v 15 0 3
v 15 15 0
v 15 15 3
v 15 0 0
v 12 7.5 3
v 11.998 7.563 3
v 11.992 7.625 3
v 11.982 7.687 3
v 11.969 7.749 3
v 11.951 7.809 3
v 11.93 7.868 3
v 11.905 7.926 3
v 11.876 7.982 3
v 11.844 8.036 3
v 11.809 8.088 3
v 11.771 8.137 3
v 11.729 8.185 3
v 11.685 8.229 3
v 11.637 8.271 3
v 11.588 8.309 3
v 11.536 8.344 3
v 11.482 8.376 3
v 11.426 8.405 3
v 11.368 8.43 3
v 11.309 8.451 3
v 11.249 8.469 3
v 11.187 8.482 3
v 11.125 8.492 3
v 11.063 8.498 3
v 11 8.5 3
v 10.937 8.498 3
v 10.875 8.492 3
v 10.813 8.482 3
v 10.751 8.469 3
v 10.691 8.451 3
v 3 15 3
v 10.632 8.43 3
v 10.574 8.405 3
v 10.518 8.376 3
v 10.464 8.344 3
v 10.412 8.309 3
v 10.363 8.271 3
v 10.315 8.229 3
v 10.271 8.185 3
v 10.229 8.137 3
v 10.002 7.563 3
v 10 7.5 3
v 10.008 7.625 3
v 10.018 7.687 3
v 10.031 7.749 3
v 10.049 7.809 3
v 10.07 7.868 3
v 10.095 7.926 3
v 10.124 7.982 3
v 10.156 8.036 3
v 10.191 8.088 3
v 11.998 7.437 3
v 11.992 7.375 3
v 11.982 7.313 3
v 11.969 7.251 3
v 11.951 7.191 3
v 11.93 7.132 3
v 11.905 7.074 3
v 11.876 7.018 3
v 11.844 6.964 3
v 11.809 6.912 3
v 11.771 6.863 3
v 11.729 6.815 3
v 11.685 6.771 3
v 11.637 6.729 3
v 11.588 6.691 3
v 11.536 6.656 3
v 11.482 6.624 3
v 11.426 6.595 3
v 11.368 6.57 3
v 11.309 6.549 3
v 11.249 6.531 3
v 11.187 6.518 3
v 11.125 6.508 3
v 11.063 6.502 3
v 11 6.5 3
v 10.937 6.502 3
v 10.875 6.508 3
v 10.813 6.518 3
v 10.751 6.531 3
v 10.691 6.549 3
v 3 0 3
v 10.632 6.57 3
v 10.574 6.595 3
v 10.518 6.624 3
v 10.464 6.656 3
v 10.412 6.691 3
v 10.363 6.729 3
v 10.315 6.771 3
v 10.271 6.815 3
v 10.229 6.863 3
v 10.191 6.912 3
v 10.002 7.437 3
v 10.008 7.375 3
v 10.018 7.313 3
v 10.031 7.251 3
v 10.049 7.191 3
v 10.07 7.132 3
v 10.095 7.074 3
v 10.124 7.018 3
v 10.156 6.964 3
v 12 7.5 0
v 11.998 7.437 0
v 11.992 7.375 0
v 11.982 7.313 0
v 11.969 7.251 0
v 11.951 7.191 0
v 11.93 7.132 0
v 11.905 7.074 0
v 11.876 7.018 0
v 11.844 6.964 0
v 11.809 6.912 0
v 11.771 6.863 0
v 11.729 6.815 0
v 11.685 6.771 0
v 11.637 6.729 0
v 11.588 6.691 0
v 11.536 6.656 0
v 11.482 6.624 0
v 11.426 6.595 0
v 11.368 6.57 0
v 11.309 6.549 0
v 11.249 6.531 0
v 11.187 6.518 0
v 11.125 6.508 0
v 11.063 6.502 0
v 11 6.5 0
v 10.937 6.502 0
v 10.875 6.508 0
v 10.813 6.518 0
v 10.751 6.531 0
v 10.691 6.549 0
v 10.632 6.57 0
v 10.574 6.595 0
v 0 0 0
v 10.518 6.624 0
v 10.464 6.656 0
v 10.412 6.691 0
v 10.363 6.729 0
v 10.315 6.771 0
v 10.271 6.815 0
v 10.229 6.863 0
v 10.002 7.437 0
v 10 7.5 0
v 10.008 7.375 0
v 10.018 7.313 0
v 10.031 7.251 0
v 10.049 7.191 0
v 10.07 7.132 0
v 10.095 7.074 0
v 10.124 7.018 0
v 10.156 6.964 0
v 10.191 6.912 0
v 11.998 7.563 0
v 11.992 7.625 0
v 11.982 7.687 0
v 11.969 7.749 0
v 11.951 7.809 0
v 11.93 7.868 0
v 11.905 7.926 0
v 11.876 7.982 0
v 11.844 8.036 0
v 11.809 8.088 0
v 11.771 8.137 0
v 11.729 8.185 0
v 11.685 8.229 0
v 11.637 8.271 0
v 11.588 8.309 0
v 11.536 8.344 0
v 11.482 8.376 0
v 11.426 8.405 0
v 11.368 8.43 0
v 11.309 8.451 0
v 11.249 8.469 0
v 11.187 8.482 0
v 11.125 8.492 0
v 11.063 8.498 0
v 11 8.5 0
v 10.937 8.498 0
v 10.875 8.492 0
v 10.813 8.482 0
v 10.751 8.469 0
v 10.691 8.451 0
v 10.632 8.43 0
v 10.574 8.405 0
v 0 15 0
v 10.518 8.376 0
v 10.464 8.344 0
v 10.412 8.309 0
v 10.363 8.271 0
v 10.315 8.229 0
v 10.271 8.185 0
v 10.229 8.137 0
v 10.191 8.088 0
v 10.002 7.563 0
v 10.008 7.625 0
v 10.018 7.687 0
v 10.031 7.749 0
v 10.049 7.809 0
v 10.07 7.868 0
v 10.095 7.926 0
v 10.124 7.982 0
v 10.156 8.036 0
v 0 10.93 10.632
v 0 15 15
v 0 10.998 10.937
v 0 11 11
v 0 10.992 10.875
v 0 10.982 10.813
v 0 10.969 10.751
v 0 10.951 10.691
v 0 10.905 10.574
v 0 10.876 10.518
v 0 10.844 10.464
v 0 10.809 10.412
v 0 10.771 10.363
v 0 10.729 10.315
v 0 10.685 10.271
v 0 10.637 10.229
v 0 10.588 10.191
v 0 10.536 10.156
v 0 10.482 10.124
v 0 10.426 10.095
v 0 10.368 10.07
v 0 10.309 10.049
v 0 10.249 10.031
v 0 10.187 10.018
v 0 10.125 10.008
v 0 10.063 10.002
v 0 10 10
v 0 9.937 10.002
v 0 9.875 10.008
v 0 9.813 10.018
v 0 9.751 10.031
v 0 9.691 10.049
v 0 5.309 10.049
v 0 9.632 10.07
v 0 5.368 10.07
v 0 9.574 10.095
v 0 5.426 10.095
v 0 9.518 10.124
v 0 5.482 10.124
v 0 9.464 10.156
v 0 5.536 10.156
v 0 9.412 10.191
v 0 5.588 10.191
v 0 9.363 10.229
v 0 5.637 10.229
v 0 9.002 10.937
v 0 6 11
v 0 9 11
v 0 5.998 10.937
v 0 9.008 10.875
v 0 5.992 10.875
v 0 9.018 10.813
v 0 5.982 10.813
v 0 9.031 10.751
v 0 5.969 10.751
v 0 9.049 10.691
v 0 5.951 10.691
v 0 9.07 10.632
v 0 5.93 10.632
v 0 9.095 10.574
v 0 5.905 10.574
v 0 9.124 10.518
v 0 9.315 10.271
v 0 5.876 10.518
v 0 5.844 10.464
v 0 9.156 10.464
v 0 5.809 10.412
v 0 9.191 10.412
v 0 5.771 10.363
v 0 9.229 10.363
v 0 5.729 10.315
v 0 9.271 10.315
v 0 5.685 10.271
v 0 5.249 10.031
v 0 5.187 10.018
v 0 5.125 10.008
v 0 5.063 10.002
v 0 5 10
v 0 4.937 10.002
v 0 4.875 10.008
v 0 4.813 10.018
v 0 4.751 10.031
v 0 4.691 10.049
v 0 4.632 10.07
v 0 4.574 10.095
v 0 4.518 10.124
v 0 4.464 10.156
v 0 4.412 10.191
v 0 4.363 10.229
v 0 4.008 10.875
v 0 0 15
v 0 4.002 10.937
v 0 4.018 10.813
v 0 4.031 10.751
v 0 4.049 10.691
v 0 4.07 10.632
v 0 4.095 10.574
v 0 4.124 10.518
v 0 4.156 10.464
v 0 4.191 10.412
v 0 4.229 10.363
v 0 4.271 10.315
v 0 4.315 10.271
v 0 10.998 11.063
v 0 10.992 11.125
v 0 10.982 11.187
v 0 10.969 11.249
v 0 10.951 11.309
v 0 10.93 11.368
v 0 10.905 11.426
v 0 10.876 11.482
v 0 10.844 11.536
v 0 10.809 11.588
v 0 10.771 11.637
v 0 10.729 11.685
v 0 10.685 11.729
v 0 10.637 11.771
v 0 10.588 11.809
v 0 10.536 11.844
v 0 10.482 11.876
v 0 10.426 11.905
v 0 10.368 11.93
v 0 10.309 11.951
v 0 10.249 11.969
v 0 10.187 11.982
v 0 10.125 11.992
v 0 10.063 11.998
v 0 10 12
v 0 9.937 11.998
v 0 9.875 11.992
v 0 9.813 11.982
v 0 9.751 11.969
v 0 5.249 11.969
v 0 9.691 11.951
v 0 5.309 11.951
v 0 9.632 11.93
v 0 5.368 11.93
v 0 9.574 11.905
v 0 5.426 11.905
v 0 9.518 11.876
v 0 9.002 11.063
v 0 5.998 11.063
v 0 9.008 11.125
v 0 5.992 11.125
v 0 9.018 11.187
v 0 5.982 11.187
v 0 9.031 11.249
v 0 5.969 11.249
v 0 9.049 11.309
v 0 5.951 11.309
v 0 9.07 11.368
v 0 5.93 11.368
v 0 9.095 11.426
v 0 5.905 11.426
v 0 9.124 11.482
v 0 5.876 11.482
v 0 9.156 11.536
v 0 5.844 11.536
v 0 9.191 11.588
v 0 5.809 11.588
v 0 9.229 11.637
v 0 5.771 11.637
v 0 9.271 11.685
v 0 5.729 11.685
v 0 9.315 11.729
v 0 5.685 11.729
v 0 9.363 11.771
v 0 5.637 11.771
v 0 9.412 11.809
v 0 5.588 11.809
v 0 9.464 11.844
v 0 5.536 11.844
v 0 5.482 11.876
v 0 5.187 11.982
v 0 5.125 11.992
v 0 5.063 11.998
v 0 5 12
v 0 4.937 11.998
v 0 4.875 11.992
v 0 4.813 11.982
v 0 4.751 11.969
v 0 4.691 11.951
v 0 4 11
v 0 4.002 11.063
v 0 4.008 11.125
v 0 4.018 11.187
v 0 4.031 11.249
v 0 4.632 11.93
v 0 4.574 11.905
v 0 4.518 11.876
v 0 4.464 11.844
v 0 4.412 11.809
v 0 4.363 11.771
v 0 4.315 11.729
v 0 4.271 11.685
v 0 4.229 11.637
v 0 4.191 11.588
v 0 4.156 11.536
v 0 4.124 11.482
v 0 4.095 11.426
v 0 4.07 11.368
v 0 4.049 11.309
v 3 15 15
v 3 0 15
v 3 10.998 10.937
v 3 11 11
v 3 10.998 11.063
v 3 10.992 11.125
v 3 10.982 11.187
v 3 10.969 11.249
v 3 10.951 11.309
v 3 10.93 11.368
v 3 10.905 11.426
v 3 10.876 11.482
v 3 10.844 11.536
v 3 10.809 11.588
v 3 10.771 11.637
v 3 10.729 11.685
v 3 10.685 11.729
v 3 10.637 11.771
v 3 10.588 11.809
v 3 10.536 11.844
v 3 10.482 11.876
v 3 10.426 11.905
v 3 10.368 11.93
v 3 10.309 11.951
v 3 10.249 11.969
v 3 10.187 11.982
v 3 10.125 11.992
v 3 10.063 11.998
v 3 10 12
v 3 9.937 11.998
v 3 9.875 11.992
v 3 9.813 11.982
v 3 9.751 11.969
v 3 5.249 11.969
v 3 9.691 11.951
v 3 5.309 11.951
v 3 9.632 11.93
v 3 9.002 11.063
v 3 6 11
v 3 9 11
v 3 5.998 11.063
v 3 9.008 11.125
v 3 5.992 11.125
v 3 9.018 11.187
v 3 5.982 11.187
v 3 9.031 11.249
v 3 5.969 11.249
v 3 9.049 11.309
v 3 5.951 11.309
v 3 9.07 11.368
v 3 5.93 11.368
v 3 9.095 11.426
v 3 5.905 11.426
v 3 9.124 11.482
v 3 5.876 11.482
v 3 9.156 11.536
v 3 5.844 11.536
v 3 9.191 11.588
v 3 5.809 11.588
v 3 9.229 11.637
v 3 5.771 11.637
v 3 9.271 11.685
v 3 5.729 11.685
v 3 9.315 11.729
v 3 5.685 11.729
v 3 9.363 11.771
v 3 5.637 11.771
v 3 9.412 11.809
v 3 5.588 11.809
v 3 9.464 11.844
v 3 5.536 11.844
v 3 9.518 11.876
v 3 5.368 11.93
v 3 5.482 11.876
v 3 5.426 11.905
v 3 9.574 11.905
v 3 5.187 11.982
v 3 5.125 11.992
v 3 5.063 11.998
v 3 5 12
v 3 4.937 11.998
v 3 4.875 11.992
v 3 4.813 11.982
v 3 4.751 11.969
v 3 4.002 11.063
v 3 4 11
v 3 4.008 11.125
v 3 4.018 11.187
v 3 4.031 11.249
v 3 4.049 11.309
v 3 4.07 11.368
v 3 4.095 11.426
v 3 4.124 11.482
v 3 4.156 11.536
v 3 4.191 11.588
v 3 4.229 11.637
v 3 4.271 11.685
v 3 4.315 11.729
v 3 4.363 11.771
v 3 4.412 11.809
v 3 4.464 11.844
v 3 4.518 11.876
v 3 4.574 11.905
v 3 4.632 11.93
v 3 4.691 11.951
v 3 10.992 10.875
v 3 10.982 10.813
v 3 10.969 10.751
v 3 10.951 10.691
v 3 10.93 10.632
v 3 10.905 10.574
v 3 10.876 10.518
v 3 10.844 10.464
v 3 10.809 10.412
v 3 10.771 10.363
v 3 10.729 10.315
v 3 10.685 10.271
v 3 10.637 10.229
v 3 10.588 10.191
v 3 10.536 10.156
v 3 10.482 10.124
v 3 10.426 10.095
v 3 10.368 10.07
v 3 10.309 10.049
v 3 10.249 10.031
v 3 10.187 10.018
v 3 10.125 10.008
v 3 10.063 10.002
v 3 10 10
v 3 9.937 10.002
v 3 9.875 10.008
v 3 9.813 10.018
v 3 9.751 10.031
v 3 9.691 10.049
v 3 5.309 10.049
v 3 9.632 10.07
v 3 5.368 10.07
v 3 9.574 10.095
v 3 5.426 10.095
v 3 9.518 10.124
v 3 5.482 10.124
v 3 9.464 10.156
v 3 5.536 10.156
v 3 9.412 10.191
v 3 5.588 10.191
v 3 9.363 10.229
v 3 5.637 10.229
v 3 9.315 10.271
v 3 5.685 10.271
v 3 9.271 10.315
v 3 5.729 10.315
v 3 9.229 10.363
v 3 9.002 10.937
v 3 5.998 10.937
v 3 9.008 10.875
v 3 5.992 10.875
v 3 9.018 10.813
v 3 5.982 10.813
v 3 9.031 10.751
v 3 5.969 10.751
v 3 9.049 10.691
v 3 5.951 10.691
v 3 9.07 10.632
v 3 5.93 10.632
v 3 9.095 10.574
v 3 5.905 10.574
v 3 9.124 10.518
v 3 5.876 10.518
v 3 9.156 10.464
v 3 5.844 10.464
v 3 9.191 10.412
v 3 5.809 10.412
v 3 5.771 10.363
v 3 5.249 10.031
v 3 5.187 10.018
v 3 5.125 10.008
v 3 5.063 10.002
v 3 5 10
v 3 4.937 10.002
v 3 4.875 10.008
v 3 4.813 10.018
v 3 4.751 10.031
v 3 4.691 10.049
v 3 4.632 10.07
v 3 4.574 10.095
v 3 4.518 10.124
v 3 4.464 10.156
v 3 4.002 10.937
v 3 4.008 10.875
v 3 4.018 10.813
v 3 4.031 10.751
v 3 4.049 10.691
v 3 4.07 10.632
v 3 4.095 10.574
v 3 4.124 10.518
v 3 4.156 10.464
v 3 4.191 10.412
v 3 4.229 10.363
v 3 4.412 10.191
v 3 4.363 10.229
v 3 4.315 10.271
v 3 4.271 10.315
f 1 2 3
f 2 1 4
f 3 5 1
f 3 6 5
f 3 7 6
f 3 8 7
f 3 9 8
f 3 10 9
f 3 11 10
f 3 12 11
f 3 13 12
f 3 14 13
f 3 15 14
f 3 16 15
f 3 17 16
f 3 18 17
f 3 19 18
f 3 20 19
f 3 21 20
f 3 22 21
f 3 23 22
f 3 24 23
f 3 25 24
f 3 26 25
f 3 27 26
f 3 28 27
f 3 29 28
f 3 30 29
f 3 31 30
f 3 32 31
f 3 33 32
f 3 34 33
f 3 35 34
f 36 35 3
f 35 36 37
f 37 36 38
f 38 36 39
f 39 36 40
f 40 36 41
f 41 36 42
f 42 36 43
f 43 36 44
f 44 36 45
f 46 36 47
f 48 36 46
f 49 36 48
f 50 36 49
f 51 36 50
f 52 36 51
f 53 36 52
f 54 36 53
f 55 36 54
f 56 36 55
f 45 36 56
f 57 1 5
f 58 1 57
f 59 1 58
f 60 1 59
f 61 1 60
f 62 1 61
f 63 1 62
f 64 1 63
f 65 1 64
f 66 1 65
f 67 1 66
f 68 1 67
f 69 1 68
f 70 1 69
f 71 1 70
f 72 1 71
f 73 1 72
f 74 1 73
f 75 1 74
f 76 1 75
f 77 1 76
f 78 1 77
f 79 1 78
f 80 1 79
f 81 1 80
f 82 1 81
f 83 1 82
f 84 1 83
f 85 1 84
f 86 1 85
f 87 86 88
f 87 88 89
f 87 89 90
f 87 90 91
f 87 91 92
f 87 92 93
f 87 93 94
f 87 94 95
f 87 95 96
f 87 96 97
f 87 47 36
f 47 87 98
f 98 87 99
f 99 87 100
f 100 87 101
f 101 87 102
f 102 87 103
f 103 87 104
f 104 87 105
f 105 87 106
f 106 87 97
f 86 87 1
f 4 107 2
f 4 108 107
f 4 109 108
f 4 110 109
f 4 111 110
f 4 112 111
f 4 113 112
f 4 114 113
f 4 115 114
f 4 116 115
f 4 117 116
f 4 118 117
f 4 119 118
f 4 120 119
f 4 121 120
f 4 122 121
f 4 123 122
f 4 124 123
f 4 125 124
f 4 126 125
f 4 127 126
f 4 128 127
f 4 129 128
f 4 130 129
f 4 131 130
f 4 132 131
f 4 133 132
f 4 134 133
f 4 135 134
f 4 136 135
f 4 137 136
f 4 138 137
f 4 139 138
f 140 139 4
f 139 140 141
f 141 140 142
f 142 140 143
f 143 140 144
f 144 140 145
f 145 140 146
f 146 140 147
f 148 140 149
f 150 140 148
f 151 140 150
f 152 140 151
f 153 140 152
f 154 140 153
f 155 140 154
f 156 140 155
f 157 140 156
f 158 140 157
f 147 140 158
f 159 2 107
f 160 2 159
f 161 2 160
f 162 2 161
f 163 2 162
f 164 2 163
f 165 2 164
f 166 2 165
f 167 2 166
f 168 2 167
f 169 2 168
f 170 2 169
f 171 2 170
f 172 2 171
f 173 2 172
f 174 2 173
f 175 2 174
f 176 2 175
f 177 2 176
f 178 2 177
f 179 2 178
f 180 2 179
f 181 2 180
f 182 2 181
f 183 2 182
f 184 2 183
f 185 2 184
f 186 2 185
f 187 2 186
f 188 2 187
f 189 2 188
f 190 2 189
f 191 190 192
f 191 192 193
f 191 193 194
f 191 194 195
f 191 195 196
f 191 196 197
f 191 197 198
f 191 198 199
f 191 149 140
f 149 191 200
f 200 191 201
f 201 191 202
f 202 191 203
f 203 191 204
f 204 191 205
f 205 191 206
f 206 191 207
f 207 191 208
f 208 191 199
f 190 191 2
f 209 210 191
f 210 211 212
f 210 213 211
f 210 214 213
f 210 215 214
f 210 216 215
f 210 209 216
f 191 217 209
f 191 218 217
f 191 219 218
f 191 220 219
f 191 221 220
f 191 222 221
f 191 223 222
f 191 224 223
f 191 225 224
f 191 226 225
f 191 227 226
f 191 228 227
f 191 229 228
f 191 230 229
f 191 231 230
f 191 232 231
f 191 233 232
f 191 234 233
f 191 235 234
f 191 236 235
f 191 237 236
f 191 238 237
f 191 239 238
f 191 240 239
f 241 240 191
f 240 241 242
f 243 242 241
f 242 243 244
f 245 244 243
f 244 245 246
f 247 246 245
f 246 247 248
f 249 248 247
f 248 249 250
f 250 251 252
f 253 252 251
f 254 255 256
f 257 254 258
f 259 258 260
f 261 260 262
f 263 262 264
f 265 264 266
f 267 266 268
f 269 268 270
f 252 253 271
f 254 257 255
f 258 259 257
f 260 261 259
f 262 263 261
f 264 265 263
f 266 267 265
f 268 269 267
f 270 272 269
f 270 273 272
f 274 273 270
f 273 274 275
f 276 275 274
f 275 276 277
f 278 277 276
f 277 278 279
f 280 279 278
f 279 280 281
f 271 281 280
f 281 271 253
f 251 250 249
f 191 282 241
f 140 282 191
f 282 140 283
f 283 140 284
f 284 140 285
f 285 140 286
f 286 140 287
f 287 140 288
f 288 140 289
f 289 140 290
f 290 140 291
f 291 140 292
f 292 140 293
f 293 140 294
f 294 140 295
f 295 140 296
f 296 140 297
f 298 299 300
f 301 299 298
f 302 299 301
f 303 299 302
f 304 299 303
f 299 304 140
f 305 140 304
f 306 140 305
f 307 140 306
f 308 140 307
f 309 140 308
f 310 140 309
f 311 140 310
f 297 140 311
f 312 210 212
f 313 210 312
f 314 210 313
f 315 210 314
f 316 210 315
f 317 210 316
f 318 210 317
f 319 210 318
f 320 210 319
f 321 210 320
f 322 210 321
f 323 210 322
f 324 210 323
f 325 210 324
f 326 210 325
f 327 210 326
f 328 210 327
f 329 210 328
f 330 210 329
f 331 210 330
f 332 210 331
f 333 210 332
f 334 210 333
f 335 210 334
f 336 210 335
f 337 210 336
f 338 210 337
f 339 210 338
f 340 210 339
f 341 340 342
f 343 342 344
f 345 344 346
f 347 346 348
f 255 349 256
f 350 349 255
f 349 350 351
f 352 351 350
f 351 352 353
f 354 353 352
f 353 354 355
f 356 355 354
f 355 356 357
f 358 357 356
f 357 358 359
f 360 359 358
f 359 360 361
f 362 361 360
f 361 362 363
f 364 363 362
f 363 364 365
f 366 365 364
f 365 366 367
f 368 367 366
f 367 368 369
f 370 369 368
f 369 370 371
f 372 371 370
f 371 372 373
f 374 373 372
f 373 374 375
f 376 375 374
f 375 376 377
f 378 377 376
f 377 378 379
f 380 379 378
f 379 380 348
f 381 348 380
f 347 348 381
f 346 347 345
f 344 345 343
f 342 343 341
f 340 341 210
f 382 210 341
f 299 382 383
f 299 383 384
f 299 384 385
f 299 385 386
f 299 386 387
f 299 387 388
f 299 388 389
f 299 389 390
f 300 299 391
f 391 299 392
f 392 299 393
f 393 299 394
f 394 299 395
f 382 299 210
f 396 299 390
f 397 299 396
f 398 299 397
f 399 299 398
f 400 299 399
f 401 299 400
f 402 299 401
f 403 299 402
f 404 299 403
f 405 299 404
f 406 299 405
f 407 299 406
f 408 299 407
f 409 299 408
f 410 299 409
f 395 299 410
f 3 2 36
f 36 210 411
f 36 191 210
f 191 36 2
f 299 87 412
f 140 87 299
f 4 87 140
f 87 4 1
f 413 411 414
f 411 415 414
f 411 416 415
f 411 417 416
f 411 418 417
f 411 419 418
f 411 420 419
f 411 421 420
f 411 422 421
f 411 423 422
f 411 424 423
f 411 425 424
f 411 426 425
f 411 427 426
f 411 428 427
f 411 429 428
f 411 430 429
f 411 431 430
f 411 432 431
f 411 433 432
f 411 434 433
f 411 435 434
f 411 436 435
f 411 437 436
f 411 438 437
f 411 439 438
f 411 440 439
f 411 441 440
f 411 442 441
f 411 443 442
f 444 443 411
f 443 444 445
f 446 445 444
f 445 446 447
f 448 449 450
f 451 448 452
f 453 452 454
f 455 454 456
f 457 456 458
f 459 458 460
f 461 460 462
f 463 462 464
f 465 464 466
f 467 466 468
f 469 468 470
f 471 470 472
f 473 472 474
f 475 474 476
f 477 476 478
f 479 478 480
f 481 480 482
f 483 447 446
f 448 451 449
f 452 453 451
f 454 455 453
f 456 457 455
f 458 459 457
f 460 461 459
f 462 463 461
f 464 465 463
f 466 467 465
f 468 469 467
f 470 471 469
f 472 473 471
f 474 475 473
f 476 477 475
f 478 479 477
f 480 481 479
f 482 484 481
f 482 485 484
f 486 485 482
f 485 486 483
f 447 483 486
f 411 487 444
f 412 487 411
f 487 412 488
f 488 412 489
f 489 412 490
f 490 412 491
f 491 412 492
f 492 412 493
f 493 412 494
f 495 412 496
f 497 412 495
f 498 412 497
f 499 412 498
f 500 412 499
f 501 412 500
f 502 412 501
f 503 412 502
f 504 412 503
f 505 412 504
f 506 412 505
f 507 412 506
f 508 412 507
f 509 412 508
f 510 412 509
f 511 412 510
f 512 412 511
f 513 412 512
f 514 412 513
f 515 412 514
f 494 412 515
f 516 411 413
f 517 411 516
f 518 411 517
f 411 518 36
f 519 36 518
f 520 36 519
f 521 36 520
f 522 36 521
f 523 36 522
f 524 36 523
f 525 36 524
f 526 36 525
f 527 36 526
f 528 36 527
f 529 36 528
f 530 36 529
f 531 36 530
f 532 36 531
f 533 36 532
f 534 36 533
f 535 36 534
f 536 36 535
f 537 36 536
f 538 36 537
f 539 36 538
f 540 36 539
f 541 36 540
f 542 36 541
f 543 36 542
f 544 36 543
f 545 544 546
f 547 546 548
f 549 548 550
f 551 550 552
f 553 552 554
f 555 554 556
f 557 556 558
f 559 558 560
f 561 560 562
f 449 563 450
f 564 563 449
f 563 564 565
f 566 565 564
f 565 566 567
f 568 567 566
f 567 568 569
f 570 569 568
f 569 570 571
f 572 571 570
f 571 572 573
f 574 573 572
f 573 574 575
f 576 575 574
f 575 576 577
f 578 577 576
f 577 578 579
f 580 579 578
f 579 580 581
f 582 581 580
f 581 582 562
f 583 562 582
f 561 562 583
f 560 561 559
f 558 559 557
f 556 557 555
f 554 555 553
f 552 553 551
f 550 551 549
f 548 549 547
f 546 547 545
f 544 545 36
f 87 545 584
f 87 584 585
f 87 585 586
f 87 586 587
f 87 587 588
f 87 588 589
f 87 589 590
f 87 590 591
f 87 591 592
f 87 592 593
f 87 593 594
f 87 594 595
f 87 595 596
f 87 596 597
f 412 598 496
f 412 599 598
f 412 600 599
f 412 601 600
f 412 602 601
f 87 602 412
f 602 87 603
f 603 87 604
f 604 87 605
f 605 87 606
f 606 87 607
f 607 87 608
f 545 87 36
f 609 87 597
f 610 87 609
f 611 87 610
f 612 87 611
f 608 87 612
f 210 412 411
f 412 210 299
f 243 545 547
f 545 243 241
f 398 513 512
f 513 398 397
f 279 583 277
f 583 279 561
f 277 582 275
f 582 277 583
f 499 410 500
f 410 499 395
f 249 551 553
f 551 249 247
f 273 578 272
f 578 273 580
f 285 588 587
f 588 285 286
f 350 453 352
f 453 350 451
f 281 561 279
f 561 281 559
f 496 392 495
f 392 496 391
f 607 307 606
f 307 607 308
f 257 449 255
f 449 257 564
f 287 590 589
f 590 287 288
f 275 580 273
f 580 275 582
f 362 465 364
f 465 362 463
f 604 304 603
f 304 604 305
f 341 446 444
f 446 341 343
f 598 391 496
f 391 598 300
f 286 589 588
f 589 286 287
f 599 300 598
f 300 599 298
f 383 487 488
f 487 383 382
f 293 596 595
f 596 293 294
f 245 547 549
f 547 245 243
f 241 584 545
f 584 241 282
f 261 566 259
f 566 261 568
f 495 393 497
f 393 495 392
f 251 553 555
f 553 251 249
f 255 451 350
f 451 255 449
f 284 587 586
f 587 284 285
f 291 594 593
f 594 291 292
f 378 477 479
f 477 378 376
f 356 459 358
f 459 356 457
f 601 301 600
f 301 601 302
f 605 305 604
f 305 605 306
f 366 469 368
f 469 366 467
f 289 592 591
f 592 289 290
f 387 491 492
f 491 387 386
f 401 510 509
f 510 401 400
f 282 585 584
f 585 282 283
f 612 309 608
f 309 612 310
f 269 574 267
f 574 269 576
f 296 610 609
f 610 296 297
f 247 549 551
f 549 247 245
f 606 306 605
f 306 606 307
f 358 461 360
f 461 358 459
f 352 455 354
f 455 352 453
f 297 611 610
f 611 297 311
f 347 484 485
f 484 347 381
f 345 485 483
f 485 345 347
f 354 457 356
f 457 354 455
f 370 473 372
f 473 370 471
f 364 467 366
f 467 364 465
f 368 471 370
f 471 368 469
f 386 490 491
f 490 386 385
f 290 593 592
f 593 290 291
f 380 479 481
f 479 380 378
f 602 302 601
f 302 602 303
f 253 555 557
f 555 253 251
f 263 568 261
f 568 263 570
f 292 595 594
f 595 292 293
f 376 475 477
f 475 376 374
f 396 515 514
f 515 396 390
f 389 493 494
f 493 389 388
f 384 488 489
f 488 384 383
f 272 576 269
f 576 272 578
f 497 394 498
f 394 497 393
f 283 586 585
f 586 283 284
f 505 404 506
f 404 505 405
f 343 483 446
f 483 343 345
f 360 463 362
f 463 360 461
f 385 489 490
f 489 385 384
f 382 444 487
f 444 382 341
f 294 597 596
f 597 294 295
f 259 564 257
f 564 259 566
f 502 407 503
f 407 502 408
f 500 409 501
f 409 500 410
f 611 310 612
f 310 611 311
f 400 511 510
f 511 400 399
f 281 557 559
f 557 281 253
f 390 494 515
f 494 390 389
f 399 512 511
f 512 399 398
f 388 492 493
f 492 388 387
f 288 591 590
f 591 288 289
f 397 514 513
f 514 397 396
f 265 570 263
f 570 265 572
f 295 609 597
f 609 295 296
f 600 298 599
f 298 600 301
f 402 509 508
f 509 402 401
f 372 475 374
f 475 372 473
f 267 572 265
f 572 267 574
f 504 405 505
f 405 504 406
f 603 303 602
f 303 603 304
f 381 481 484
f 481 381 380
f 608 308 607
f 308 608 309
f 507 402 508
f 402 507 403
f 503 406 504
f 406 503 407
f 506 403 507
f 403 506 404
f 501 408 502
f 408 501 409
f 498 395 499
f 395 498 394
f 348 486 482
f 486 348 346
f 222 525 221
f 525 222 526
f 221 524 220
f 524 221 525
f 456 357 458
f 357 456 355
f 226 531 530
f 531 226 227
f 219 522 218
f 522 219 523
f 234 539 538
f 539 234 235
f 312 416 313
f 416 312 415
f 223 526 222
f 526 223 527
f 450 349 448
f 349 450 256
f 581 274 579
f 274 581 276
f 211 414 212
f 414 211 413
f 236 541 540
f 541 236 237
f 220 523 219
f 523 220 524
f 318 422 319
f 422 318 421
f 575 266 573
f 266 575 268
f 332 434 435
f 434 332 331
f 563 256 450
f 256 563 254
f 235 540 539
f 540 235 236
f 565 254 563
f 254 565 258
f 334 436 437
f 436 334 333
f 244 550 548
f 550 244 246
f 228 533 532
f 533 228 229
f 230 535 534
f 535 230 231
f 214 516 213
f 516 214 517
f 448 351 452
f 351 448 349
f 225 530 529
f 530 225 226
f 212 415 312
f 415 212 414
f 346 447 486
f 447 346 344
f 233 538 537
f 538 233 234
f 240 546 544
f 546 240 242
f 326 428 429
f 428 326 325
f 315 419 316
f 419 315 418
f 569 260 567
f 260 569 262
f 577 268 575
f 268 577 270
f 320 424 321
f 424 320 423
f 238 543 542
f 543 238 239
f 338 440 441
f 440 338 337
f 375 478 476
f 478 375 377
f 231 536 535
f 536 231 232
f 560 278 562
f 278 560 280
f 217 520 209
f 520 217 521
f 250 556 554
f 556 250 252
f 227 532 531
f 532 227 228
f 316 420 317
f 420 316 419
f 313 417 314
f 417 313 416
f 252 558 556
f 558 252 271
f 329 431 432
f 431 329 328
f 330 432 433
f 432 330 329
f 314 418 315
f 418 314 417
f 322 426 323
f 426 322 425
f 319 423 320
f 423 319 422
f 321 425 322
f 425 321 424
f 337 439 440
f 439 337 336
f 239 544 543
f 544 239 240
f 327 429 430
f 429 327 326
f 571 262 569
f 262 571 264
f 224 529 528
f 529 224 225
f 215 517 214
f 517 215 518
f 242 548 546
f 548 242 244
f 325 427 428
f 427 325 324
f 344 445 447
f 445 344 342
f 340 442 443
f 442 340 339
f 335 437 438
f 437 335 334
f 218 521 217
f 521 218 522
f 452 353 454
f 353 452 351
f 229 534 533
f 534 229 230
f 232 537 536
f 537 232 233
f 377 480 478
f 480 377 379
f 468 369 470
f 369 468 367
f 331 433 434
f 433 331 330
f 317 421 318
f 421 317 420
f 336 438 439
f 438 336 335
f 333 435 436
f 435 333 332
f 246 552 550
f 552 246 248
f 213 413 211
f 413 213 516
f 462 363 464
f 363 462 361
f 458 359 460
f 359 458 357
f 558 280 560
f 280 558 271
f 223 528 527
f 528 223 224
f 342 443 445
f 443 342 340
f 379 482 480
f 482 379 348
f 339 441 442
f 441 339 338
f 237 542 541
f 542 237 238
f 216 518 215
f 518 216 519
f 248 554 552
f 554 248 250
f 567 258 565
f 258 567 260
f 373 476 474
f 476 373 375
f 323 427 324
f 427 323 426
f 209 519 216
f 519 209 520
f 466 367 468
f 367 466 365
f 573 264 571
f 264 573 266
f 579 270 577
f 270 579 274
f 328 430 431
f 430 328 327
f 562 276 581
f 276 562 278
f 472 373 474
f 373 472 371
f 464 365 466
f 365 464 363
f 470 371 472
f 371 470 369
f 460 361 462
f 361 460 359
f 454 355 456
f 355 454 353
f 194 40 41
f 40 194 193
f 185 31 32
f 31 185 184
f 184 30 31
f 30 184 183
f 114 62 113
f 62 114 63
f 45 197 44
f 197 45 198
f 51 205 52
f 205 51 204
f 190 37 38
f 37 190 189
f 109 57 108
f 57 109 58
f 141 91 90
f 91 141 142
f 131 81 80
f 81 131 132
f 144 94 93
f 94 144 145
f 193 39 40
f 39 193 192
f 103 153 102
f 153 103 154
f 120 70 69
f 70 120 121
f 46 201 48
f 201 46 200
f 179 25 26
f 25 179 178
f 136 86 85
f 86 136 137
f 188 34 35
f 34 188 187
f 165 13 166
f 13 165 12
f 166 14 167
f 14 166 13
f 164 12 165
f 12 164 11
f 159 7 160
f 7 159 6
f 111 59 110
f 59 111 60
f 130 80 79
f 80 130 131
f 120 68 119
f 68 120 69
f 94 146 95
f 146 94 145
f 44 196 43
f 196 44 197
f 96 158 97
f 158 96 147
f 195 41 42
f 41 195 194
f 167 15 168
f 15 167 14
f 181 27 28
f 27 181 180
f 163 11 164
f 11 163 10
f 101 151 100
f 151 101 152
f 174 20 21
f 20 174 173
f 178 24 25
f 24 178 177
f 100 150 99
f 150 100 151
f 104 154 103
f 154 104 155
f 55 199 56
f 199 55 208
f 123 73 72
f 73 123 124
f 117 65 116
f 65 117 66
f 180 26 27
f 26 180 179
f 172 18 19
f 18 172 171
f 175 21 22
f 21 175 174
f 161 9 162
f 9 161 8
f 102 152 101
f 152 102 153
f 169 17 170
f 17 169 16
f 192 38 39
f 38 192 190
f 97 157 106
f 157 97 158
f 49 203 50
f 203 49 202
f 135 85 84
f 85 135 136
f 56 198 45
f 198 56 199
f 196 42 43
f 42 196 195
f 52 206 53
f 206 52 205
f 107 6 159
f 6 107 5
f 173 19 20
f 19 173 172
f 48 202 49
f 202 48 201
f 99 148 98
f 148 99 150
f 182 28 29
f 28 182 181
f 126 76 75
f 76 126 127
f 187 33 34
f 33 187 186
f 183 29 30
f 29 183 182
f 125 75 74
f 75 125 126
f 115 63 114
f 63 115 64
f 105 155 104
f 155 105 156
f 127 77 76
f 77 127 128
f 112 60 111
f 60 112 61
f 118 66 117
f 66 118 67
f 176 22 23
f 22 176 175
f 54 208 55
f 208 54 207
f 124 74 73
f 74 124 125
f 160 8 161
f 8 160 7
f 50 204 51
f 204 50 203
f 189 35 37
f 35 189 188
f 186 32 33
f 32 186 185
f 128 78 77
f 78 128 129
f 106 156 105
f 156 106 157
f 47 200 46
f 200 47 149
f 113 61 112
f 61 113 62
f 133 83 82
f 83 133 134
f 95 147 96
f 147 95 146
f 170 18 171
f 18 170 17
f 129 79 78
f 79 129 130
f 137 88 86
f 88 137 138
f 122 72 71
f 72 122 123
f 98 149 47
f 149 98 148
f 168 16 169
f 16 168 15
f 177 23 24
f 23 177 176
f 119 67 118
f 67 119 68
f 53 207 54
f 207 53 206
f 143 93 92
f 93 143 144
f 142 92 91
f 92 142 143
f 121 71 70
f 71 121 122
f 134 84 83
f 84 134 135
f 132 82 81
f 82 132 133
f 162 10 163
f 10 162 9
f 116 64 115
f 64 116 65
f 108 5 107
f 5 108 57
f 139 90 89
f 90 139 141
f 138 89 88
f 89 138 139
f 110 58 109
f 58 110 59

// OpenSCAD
difference(){
	union(){
        translate([0,0,0]){
           cube([15,15,3], center=false);
        }	   
        translate([0,0,0]){
           cube([3,15,15], center=false);
        }	   

 
	}
	union() {

       translate([0,5,11]){
            rotate(a = [0,90,0]) {
                cylinder(h=600, r=1.0, $fn=100, center=true);
            }
       }   
       translate([0,10,11]){
            rotate(a = [0,90,0]) {
                cylinder(h=600, r=1.0, $fn=100, center=true);
            }
       }   
       translate([11,7.5,0]){
            rotate(a = [0,0,90]) {
                cylinder(h=600, r=1.0, $fn=100, center=true);
            }
       }   

        
	}
}
